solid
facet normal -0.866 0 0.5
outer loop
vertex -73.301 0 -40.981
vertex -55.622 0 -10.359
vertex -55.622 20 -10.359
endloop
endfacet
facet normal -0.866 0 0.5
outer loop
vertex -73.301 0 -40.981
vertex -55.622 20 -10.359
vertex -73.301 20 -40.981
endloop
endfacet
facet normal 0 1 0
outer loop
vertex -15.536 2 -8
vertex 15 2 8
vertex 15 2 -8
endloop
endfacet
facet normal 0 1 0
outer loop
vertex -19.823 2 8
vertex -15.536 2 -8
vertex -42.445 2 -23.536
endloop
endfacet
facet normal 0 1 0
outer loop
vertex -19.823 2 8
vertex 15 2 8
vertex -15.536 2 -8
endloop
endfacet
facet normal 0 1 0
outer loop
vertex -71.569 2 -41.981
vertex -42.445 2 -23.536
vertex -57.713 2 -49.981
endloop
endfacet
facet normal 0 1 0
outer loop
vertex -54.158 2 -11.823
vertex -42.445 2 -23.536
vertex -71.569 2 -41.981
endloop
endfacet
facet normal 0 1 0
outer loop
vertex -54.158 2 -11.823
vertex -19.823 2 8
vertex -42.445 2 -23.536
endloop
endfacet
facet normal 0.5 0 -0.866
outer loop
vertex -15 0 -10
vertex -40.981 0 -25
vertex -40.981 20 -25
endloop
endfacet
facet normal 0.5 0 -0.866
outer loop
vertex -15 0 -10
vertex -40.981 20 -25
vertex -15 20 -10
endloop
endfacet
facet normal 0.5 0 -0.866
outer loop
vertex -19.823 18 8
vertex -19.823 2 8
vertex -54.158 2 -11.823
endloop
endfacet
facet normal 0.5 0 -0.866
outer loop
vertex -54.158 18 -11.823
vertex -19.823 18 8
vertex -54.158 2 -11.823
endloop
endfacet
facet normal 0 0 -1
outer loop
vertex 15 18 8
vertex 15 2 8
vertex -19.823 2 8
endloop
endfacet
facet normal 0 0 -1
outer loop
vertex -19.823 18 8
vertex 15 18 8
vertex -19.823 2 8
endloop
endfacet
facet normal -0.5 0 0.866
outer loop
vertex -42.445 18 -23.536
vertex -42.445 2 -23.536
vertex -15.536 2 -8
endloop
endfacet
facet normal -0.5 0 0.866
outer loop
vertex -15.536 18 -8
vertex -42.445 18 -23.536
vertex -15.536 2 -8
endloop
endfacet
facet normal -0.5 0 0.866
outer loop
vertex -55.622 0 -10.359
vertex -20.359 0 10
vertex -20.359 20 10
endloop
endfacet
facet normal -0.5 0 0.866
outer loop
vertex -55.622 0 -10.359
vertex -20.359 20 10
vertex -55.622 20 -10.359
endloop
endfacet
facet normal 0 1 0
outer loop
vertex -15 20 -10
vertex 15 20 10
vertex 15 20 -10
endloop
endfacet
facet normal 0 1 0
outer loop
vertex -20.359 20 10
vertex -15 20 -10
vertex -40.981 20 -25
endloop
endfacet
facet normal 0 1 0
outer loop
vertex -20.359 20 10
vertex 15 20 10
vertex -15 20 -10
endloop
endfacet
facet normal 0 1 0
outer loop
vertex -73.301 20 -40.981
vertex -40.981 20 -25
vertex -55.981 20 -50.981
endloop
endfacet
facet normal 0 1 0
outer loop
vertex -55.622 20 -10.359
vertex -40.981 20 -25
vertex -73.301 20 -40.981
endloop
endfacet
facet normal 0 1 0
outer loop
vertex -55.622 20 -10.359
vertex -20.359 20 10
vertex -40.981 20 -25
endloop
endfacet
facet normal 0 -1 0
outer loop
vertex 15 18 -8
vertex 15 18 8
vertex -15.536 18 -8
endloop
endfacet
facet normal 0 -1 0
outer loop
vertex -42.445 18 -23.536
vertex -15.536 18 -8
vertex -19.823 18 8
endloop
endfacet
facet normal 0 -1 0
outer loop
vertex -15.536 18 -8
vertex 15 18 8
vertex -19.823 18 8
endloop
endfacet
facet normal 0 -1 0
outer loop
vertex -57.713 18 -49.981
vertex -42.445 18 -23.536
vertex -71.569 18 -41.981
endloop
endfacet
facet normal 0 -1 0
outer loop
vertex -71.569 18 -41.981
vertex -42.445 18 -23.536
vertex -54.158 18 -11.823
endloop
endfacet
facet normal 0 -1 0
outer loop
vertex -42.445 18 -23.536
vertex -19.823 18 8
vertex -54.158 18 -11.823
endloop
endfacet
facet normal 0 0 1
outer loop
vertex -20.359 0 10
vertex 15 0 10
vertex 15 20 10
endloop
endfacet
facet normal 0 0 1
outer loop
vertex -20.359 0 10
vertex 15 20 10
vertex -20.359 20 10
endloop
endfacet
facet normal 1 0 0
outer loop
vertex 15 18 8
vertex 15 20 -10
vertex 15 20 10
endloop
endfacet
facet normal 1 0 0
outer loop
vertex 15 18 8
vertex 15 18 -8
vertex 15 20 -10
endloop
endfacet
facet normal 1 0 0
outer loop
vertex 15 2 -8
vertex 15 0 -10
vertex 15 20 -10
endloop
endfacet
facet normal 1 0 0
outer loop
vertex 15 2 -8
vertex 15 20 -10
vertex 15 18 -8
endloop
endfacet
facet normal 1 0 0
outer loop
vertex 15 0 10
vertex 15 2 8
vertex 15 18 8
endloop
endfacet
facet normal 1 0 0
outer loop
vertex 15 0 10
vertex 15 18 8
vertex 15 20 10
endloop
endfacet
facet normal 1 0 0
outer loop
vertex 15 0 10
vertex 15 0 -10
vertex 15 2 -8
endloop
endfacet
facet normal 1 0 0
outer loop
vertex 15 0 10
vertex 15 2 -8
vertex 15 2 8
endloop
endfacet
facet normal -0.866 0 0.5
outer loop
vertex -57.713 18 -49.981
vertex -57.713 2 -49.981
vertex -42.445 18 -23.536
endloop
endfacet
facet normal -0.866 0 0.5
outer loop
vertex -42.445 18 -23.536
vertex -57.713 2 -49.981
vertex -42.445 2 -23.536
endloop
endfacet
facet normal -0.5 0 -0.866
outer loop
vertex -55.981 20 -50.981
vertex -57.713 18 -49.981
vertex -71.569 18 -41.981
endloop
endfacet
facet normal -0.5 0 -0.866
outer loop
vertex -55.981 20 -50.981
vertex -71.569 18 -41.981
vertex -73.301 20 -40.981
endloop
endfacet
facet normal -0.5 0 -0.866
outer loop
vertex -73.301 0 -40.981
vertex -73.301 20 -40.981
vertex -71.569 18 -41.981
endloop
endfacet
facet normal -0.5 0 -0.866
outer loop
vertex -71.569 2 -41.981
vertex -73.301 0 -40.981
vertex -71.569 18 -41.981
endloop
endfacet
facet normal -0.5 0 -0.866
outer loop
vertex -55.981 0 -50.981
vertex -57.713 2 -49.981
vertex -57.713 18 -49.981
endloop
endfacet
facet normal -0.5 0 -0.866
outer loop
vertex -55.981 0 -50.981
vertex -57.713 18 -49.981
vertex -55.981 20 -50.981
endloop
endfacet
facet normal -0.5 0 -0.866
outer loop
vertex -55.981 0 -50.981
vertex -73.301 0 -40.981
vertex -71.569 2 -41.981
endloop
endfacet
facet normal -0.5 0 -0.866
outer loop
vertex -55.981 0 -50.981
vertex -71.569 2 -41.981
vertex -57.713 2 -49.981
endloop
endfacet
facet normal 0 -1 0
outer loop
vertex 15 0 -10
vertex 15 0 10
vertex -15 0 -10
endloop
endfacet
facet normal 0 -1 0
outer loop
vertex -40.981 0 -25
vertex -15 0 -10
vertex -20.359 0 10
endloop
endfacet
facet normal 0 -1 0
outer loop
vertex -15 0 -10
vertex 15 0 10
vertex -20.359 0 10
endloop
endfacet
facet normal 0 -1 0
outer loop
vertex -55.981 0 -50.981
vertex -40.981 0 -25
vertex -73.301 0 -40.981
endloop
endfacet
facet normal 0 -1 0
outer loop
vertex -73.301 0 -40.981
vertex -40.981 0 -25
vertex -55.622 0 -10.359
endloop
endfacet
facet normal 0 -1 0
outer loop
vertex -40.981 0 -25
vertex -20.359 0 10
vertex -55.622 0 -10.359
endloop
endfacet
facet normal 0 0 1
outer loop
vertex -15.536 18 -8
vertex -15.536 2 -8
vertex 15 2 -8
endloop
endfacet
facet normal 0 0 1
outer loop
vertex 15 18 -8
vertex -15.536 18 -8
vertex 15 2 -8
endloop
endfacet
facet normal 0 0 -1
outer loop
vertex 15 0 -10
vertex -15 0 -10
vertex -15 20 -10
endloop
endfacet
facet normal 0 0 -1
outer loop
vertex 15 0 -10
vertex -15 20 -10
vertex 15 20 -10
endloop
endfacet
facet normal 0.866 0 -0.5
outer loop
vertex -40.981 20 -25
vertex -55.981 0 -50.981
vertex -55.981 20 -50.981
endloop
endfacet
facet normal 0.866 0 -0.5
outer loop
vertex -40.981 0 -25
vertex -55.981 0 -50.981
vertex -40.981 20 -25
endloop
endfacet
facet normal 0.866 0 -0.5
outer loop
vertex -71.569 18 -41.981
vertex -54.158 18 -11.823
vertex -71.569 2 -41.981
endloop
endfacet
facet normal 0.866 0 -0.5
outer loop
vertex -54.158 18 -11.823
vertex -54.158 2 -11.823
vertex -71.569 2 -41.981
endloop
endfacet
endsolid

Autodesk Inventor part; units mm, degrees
ref_plane "YZ Plane" through (0, 0, 0) normal (1, 0, 0) x (0, 1, 0)
ref_plane "XZ Plane" through (0, 0, 0) normal (0, 1, 0) x (-1, 0, 0)
ref_plane "XY Plane" through (0, 0, 0) normal (0, 0, 1) x (1, 0, 0)
sketch "Sketch1" plane through (0, 0, 0) normal (0, 1, 0) x (-1, 0, 0)
  line L0 (-15, 10) -> (20.359, 10)
  line L1 (25, 7.3205) -> (15, -10) construction
  line L2 (15, -10) -> (-15, -10)
  line L3 (-15, -10) -> (-15, 10)
  line L4 (-15, 10) -> (15, -10) construction
  line L5 (15, 10) -> (-15, -10) construction
  line L6 (20.359, 10) -> (55.6218, -10.359)
  line L7 (58.3013, -15) -> (40.9808, -25) construction
  line L8 (40.9808, -25) -> (15, -10)
  line L9 (15, -10) -> (15, 10) construction
  line L10 (55.6218, -10.359) -> (73.3013, -40.9808)
  line L11 (73.3013, -40.9808) -> (55.9808, -50.9808)
  line L12 (55.9808, -50.9808) -> (40.9808, -25)
  line L13 (40.9808, -25) -> (50.9808, -7.6795) construction
  point P0 (0, 0)
  point P1 (15, -10)
  dimension "d0" = 30
extrude "Extrusion1" add sketch "Sketch1" along normal blind 20
shell "Shell1" thickness 2 removed faces 2 at (-61.7543, 6.6667, -47.6474) at (15, 6.6667, 3.3333)
properties part number "finger_two_bend_hollow"
